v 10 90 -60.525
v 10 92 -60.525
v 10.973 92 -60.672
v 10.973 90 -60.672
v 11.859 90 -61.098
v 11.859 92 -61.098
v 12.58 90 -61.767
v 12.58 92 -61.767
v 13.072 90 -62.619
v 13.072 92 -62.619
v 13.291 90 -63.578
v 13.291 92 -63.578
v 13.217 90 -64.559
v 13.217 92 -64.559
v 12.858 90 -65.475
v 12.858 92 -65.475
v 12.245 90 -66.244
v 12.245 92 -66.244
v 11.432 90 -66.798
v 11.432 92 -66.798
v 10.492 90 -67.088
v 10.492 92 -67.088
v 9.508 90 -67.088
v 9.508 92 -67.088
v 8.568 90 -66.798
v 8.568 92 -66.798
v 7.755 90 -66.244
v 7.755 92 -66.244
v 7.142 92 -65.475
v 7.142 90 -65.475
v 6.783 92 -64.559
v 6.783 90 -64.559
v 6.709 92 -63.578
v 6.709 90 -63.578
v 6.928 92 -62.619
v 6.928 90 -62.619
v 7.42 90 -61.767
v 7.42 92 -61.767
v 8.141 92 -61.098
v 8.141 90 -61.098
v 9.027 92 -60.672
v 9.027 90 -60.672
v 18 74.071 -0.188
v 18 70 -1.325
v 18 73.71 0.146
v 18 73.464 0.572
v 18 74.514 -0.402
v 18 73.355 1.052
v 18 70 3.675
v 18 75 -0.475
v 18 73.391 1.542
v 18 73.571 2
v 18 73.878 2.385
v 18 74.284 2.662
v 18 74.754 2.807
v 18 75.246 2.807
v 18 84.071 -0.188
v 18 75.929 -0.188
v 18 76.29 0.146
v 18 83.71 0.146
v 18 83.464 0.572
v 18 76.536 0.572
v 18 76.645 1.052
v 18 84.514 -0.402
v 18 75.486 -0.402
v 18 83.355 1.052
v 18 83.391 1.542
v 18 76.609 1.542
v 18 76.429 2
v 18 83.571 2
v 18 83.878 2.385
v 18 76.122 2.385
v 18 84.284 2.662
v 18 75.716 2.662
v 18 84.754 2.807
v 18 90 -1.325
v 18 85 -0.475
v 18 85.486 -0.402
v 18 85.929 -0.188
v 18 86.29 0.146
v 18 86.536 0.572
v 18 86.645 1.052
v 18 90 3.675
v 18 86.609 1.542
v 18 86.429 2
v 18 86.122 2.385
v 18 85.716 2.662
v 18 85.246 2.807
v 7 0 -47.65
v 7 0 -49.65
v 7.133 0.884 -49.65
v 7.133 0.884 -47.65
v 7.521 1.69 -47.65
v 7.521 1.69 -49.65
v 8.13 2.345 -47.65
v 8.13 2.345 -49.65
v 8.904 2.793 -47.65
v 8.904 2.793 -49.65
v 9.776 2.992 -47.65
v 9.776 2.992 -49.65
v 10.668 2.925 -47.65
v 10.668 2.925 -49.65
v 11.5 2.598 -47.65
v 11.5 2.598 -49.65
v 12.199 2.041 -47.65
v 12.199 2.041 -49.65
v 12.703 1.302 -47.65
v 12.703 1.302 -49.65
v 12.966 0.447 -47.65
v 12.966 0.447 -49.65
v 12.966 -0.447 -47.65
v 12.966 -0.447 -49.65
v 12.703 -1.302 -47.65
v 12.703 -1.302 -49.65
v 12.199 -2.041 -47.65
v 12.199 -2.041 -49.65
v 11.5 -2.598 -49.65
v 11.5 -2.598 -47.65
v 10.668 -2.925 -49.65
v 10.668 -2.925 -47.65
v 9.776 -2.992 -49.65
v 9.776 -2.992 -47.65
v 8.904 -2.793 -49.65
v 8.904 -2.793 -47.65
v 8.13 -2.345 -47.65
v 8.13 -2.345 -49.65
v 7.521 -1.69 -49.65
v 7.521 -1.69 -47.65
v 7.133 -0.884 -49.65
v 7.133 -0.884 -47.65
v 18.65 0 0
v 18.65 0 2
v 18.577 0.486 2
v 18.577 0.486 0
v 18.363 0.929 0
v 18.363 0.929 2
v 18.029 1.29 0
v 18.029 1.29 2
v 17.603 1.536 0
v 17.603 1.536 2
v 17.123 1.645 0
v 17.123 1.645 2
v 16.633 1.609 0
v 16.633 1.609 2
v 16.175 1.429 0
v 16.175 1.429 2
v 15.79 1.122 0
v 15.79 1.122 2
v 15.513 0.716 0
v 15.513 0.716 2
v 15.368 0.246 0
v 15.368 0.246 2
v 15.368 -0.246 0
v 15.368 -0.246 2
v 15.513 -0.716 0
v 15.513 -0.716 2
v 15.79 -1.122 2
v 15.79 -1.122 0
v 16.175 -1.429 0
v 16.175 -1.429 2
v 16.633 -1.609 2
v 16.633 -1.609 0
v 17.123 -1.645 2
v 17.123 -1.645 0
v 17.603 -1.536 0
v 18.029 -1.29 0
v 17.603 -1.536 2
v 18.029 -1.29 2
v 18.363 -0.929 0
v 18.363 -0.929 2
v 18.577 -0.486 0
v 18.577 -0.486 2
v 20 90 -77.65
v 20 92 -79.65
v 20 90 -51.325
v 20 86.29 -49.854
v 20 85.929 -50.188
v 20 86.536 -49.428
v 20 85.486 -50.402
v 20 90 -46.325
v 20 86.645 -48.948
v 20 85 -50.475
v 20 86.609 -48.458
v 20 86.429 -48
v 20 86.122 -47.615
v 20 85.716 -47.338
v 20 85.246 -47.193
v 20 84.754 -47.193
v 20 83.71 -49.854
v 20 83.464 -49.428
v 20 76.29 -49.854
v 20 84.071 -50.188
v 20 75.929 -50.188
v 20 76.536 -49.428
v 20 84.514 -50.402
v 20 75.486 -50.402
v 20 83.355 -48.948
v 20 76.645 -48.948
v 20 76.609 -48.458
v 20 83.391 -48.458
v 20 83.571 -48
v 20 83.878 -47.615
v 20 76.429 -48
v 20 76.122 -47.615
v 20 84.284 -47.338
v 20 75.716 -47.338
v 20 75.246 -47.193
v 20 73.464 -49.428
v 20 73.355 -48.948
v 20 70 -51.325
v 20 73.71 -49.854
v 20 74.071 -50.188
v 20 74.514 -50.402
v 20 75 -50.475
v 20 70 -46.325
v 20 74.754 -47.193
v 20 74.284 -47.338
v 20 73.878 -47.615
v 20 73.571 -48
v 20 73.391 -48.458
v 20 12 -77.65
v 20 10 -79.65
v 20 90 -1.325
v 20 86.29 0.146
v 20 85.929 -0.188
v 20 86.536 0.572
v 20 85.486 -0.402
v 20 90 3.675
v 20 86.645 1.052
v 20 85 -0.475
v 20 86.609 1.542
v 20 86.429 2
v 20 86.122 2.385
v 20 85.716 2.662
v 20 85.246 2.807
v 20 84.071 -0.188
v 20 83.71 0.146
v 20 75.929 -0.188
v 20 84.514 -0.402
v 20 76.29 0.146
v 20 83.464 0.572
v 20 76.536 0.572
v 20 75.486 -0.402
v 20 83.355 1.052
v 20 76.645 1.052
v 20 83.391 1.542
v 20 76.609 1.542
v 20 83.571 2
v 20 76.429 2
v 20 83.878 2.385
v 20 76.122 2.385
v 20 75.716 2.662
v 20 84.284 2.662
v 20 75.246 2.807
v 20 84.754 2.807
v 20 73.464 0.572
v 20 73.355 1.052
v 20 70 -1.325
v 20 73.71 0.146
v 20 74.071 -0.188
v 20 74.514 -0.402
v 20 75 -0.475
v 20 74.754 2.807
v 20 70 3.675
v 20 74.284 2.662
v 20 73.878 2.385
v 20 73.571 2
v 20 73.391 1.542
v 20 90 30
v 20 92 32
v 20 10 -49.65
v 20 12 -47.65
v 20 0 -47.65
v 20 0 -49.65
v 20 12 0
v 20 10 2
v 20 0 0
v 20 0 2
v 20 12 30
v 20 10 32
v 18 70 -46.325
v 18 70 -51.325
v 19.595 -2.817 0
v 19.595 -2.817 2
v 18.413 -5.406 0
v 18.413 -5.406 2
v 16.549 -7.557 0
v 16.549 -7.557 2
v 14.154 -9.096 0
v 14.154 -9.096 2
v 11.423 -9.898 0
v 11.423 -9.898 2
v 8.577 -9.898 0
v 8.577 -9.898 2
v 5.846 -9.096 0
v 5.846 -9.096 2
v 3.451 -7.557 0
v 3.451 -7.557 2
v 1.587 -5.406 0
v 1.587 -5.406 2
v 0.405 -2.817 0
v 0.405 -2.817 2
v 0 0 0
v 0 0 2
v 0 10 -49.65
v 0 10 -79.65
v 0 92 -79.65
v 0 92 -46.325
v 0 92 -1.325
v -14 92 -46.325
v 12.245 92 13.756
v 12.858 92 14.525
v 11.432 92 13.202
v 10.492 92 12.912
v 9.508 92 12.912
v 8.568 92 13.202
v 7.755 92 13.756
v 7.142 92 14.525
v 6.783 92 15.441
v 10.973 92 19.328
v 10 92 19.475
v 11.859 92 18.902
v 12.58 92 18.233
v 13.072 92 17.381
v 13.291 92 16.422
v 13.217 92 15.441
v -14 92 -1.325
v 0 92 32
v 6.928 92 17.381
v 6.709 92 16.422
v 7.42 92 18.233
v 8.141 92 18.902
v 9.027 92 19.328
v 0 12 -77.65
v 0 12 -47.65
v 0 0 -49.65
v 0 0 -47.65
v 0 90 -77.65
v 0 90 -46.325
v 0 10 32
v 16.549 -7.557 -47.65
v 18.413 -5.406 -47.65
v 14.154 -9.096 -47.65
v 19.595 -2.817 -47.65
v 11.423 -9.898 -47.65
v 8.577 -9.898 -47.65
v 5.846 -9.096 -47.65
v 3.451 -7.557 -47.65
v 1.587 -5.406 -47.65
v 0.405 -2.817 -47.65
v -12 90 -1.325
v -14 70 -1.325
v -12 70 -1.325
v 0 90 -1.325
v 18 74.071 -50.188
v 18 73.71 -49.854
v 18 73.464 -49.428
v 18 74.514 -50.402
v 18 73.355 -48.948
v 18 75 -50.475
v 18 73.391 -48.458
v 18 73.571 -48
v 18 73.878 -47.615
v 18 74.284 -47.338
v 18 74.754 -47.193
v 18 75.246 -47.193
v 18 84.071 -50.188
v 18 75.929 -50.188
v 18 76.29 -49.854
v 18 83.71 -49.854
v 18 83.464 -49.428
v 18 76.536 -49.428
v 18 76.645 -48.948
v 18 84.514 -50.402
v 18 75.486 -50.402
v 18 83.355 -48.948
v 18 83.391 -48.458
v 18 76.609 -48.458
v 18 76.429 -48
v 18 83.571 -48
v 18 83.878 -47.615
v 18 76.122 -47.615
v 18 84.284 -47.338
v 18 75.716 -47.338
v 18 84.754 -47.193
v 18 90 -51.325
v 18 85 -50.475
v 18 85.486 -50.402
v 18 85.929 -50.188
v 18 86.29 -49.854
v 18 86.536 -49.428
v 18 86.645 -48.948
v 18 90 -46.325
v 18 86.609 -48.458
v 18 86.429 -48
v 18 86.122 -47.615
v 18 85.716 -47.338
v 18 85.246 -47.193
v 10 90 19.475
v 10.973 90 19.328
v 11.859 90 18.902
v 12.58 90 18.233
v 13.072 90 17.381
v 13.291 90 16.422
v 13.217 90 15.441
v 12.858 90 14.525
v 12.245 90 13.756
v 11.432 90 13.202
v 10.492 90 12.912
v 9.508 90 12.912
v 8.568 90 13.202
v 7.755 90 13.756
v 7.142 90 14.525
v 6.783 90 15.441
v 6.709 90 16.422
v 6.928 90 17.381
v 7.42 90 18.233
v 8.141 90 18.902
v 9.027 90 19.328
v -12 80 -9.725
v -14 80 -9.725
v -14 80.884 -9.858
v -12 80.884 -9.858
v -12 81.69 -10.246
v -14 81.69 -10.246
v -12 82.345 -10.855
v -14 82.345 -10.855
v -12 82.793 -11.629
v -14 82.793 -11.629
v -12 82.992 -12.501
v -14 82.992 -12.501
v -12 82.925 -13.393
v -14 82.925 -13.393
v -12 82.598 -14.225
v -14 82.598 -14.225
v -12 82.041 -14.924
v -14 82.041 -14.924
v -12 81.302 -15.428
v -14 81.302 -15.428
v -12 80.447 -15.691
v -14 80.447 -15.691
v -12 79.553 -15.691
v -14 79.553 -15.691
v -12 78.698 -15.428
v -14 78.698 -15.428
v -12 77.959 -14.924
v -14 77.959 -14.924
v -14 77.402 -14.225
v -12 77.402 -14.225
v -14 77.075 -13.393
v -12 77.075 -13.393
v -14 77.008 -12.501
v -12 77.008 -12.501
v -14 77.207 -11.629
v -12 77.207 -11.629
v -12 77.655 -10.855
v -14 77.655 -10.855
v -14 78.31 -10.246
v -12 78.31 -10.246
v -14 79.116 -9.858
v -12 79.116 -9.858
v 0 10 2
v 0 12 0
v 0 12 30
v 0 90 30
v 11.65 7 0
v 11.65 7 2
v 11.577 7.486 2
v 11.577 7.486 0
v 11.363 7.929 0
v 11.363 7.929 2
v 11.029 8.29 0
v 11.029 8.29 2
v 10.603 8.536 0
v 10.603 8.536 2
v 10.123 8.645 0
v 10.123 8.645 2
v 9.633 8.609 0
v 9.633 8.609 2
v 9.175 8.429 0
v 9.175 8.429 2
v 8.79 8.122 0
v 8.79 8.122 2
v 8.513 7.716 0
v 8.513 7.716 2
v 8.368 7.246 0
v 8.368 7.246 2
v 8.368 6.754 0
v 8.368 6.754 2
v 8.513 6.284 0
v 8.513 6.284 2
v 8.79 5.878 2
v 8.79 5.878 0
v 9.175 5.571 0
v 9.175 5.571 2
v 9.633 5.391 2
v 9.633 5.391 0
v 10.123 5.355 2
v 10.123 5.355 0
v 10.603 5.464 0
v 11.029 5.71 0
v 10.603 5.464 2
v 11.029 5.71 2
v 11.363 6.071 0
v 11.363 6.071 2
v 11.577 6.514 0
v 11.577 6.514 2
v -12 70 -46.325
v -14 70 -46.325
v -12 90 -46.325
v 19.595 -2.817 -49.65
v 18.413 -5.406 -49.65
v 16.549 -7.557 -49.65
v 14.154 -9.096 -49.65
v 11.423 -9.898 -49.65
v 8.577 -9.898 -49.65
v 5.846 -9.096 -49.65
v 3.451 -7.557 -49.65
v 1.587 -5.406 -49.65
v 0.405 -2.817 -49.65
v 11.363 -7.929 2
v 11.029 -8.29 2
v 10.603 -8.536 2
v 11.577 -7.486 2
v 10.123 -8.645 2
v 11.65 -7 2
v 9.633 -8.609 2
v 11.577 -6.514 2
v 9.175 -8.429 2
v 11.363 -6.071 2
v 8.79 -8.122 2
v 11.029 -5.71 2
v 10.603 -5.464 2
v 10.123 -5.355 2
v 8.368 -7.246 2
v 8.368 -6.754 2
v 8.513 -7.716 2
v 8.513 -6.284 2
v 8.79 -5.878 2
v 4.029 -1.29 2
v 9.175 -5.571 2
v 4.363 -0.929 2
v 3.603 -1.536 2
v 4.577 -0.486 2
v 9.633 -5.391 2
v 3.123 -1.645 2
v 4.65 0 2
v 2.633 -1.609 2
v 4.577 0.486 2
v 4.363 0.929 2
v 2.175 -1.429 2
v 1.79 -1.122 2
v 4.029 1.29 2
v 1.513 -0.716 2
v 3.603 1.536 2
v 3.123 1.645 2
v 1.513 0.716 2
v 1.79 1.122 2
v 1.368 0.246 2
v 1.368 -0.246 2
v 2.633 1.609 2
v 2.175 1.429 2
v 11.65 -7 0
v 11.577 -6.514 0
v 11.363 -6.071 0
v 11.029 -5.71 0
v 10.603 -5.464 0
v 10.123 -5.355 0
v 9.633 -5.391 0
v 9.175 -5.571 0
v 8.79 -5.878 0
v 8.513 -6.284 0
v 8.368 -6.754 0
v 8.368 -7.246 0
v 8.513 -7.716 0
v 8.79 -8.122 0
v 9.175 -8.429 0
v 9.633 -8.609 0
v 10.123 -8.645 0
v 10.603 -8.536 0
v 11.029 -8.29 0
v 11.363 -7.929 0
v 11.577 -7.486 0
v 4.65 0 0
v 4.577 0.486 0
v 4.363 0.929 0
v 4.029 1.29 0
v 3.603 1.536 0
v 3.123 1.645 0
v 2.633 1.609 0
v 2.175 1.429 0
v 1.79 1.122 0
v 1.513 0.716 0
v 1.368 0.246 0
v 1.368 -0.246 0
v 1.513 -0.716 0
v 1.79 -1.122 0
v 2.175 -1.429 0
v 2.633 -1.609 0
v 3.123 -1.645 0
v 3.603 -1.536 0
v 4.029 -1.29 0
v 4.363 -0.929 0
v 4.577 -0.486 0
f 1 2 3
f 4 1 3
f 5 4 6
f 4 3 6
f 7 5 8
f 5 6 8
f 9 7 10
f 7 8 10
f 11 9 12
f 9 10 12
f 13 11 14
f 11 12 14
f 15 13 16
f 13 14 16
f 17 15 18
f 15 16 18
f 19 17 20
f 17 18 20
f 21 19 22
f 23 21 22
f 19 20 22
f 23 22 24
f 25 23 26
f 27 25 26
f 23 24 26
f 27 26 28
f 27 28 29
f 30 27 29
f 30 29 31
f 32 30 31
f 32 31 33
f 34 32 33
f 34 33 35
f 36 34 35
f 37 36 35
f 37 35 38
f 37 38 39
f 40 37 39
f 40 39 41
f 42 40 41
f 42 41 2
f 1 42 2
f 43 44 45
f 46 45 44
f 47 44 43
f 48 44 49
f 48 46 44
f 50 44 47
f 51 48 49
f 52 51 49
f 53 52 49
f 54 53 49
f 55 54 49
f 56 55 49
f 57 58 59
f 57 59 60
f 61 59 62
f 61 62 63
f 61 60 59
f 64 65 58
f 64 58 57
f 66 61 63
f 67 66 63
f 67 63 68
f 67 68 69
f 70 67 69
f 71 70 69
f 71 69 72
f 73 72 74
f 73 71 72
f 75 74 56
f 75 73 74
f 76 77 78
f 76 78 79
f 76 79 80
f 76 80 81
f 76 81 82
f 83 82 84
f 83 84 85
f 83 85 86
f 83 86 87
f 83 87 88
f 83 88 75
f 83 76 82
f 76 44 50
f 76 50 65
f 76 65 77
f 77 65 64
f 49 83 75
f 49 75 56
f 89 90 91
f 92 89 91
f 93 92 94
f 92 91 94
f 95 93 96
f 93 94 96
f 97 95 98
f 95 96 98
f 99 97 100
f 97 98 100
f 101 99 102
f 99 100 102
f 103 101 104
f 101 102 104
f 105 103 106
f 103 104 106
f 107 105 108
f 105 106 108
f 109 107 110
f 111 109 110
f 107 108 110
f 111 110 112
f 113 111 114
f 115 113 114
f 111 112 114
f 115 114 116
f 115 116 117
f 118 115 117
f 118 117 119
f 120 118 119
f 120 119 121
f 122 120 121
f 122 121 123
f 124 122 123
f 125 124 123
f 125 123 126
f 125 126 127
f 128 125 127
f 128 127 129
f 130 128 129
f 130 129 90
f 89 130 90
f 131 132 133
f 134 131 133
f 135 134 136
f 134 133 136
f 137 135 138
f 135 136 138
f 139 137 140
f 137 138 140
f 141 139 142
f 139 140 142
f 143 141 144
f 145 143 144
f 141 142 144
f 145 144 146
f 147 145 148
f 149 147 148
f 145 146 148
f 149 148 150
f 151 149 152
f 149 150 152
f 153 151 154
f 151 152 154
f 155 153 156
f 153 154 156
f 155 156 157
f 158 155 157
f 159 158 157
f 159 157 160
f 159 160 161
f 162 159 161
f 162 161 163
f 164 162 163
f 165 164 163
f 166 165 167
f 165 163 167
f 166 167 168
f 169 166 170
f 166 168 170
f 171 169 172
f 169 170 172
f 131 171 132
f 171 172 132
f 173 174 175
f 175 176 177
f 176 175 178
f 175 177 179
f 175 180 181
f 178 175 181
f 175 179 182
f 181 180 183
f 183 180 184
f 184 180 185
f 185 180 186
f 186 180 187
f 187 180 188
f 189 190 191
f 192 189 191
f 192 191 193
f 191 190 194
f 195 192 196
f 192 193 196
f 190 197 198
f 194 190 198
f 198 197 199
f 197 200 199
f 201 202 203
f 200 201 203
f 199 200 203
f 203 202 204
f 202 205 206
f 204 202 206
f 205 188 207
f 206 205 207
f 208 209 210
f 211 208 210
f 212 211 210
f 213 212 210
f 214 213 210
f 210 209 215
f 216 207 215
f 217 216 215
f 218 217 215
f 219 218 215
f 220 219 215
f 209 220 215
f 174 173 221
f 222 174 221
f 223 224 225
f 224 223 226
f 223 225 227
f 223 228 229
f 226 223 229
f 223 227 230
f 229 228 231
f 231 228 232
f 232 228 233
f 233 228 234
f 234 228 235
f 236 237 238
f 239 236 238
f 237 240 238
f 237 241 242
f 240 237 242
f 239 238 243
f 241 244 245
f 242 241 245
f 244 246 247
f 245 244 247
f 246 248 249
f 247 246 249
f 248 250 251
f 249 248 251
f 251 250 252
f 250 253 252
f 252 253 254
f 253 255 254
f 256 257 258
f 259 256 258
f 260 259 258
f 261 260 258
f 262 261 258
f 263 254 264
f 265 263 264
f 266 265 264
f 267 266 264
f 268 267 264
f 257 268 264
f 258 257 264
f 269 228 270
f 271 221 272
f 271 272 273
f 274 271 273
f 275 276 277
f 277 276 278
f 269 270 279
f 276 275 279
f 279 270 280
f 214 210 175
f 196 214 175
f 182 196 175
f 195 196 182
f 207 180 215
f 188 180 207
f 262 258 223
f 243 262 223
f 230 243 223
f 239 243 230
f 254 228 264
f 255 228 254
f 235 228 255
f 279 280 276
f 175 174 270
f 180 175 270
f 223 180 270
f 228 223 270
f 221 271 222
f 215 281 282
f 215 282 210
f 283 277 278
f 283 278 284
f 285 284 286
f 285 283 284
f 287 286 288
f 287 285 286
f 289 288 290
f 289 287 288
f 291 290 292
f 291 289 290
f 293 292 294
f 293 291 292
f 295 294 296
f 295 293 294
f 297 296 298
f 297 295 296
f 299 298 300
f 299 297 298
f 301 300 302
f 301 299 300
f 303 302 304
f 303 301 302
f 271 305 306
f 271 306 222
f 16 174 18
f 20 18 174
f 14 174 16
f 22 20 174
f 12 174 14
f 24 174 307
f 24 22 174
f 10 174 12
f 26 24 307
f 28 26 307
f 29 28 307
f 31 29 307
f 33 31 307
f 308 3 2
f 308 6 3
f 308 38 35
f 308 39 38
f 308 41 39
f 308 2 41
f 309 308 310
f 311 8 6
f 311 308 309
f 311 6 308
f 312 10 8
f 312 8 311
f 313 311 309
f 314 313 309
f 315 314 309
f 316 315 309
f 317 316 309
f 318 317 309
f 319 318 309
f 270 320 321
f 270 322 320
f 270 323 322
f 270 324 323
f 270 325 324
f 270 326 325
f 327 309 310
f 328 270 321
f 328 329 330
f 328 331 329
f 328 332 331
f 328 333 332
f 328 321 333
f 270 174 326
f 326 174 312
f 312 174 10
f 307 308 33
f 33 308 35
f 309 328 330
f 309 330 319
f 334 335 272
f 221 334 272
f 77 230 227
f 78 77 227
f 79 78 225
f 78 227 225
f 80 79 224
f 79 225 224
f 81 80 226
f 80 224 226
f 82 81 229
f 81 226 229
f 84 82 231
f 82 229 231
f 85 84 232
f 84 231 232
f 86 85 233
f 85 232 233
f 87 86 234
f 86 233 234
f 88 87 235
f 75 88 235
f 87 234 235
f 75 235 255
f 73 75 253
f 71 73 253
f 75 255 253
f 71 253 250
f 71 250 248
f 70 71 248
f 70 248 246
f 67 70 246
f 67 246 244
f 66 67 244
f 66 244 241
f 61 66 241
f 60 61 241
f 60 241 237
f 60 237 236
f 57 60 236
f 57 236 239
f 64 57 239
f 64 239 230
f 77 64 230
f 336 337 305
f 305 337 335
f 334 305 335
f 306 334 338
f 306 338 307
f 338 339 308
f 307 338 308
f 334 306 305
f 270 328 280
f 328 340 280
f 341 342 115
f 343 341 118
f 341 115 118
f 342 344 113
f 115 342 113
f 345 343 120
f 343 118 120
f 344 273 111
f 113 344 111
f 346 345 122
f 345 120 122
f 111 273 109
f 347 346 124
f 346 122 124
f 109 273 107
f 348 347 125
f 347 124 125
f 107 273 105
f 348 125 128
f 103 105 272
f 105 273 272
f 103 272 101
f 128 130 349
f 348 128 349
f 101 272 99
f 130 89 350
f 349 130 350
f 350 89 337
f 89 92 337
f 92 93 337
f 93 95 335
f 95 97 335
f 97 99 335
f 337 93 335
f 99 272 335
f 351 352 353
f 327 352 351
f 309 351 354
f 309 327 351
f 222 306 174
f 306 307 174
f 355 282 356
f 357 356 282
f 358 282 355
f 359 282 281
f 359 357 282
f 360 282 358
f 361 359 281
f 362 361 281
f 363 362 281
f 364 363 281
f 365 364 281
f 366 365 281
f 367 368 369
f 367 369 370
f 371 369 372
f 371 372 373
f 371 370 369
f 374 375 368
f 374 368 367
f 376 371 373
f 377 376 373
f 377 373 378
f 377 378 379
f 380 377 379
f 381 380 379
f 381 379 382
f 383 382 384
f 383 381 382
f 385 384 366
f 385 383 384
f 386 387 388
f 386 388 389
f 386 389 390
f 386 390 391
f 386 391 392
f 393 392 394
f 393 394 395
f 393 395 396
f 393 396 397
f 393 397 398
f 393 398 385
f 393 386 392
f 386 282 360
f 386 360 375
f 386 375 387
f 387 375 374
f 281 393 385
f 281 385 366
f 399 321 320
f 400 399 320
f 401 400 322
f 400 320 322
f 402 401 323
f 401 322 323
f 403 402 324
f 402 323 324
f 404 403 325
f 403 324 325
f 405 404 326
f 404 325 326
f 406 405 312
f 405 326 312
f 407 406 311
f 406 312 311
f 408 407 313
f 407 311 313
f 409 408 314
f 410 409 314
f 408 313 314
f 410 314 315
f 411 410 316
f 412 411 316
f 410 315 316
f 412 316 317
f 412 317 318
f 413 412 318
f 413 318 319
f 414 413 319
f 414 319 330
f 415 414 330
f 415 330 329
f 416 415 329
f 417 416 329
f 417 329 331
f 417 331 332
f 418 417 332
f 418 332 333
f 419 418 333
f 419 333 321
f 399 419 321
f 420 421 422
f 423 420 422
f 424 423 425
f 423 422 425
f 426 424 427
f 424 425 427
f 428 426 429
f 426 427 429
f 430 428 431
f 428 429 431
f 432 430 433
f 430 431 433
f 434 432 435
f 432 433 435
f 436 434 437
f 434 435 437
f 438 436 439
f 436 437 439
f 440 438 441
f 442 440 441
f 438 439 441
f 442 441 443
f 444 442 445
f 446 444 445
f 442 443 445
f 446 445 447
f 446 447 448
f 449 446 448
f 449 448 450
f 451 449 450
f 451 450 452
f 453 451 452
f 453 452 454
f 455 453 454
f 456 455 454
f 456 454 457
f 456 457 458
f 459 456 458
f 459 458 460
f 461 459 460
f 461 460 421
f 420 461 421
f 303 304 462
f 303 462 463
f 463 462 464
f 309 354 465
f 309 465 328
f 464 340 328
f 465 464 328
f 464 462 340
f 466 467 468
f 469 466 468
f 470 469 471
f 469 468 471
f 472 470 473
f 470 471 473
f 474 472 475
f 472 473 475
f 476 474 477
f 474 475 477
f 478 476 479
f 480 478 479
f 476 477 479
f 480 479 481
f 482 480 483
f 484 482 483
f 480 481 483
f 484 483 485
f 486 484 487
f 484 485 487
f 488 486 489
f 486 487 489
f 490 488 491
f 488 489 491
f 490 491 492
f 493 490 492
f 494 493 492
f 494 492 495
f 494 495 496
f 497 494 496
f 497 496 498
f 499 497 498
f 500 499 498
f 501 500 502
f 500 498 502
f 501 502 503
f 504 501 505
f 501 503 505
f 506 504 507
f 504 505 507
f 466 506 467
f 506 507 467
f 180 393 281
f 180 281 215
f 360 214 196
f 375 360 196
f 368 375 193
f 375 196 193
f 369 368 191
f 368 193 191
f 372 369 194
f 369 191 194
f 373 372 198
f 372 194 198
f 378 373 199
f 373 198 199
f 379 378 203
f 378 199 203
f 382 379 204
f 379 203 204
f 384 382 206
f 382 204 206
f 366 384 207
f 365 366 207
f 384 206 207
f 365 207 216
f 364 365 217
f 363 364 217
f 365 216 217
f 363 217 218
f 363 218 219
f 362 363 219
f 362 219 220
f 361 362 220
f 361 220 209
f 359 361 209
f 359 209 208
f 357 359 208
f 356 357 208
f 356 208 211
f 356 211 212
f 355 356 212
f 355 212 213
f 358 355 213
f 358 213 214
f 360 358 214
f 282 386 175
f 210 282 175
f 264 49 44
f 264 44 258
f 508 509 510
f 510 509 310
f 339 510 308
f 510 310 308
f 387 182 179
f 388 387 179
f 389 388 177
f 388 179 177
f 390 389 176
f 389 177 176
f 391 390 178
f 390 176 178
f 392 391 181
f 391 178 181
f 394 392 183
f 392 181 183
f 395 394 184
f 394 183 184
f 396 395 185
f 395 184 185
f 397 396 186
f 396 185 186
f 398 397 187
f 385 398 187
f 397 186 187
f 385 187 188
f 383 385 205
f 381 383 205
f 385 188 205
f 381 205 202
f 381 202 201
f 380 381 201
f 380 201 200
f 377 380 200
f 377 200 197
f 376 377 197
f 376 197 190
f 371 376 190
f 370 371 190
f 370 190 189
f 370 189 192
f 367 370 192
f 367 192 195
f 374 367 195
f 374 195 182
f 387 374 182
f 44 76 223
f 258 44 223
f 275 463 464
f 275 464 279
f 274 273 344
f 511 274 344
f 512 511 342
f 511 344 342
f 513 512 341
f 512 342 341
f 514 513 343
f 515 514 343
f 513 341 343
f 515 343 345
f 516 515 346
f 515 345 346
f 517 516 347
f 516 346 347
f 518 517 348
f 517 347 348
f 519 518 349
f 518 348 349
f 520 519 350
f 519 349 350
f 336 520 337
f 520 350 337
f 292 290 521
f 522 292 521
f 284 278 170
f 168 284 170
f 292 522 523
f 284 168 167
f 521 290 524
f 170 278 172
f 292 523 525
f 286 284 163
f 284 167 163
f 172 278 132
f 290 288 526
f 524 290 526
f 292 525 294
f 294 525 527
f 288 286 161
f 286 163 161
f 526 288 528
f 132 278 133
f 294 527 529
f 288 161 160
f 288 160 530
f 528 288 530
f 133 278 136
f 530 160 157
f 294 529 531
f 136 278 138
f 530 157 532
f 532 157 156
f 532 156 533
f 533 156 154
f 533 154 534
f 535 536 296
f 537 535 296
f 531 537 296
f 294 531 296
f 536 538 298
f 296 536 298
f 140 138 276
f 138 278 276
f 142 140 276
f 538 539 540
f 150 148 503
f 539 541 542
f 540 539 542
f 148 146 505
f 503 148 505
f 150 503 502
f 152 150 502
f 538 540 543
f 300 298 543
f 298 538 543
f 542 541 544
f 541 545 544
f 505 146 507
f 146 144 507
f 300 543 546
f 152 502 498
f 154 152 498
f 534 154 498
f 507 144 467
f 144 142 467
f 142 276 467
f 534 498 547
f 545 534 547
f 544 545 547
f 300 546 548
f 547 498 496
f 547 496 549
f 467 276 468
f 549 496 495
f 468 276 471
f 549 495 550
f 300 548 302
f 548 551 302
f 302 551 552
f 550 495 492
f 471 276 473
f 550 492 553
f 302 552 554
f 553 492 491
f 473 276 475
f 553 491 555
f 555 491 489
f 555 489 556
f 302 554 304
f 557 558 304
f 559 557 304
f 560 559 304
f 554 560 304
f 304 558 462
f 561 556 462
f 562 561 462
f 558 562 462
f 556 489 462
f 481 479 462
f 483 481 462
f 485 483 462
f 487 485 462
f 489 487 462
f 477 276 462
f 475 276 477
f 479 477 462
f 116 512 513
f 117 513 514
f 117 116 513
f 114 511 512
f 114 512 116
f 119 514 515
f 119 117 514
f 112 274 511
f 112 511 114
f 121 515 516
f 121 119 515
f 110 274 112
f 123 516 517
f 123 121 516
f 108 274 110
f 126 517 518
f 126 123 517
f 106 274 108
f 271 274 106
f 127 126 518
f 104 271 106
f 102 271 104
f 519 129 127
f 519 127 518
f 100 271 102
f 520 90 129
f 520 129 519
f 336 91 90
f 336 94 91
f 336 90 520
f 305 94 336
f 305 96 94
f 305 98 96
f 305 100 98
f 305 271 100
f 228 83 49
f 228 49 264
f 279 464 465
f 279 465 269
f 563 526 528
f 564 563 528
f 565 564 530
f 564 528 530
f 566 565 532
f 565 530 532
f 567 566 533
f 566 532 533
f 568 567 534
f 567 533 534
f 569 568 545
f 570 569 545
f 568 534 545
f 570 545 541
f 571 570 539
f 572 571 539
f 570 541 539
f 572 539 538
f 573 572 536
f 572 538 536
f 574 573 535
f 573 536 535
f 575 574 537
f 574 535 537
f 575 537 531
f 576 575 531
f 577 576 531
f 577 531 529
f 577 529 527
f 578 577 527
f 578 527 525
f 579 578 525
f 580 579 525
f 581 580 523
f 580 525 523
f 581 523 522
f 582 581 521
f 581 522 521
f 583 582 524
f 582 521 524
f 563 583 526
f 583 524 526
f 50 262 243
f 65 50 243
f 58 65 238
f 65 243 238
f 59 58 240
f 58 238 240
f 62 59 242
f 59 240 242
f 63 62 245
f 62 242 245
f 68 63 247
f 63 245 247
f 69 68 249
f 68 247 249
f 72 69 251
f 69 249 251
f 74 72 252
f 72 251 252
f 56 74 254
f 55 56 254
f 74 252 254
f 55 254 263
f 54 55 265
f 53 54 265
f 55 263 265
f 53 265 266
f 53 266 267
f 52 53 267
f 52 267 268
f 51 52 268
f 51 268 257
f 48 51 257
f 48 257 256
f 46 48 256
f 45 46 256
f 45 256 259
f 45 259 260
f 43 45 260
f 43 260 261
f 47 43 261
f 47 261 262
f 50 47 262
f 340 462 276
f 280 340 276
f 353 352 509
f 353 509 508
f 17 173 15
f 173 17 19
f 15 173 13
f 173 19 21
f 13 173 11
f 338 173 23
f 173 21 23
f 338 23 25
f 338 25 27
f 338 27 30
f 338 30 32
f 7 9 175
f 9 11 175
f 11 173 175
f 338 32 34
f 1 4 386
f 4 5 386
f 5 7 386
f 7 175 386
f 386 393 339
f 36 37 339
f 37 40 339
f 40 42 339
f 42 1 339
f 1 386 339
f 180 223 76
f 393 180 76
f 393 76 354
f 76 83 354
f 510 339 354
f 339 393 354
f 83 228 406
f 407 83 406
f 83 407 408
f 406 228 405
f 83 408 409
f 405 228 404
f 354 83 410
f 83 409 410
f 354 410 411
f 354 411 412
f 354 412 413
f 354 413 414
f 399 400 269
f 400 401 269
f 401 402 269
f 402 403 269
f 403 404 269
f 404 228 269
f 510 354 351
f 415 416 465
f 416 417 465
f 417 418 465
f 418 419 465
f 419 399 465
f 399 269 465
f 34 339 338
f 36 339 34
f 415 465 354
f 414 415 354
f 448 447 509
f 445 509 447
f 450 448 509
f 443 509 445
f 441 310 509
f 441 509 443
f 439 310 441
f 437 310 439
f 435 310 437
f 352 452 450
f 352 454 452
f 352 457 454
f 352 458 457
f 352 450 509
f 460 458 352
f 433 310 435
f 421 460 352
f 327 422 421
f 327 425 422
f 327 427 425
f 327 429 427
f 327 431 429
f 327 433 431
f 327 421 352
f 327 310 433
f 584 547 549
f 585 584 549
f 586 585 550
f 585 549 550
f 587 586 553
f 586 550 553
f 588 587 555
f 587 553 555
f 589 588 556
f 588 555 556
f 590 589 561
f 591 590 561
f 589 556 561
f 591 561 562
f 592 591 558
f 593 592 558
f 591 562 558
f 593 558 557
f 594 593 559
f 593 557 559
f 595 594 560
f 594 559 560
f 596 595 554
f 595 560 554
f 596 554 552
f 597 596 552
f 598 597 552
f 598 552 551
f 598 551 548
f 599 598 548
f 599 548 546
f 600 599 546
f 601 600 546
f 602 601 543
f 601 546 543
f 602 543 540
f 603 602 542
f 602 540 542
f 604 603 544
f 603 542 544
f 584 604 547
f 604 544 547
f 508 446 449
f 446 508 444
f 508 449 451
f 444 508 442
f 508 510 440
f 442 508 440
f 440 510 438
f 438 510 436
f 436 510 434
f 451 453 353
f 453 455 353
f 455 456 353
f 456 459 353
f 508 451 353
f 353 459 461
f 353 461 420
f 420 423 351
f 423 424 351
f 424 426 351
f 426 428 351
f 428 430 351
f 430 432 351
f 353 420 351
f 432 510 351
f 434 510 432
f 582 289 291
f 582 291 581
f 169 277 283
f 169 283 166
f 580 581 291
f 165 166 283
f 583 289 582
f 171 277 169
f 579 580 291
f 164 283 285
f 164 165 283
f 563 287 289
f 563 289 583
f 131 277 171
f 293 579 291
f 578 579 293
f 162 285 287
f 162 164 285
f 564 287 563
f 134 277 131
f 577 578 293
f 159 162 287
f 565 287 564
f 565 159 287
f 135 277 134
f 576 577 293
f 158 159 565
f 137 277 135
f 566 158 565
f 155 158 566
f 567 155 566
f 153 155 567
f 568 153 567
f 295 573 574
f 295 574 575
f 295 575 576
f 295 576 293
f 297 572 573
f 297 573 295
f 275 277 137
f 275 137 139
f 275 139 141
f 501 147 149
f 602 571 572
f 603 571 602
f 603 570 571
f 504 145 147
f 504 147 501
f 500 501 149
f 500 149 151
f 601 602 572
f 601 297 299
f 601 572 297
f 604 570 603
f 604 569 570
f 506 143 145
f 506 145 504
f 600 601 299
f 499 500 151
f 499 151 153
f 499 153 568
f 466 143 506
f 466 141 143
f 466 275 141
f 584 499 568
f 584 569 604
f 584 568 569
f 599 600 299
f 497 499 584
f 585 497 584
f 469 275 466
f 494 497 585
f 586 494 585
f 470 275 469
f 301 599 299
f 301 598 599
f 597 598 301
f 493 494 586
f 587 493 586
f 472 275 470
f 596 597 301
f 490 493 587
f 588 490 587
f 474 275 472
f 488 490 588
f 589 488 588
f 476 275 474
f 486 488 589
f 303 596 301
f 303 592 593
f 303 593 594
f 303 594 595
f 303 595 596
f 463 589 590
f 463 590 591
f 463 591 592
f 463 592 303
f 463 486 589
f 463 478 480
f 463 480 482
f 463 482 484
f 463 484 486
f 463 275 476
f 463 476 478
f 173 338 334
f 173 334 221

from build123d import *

# Parameters (mm, degrees)
EXTRUDE_1_DEPTH     = 2
SKETCH_2_R          = 1.65
CUT_EXTRUDE_1_DEPTH = 2
SKETCH_3_W          = 20
SKETCH_3_H          = 2
EXTRUDE_2_DEPTH     = 30
SKETCH_4_W          = 20
SKETCH_4_H          = 2
EXTRUDE_3_DEPTH     = 80
SKETCH_5_W          = 20
SKETCH_5_H          = 2
EXTRUDE_4_DEPTH     = 109.65
SKETCH_6_W          = 20
SKETCH_6_H          = 2
EXTRUDE_5_DEPTH     = 80
CUT_EXTRUDE_2_REACH = 126.622
SKETCH_8_R          = 3
SKETCH_9_W          = 2
SKETCH_9_H          = 5
EXTRUDE_6_DEPTH     = 20
SKETCH_10_R         = 1.65
CUT_EXTRUDE_3_DEPTH = 20
SKETCH_11_R         = 3.3
CUT_EXTRUDE_4_DEPTH = 10
SKETCH_12_W         = 45
SKETCH_12_H         = 2
EXTRUDE_7_DEPTH     = 14
SKETCH_13_W         = 2
SKETCH_13_H         = 45
EXTRUDE_8_DEPTH     = 20
SKETCH_14_R         = 3
CUT_EXTRUDE_6_DEPTH = 20


with BuildPart() as part:
    # 草图1 → 凸台-拉伸1 (new body)
    with BuildSketch(Plane.XY):
        with BuildLine():
            Line((0, 0), (0, 12))
            Line((0, 12), (20, 12))
            Line((20, 12), (20, 0))
            ThreePointArc((20, 0), (10, -10), (0, 0))
        make_face()
    extrude_1 = extrude(amount=EXTRUDE_1_DEPTH)

    # 草图2 → 切除-拉伸1 (cut)
    with BuildSketch(Plane.XY.offset(2)):
        with Locations((17, 0)):
            Circle(SKETCH_2_R)
        with Locations((10, -7)):
            Circle(SKETCH_2_R)
        with Locations((3, 0)):
            Circle(SKETCH_2_R)
        with Locations((10, 7)):
            Circle(SKETCH_2_R)
    extrude(amount=-CUT_EXTRUDE_1_DEPTH, mode=Mode.SUBTRACT)

    # 草图3 → 凸台-拉伸2 (add)
    with BuildSketch(Plane.XY.offset(2)):
        with Locations((10, 11)):
            Rectangle(SKETCH_3_W, SKETCH_3_H)
    extrude_2 = extrude(amount=EXTRUDE_2_DEPTH)

    # 草图4 → 凸台-拉伸3 (add)
    with BuildSketch(Plane(origin=(0, 12, 0), x_dir=(1, 0, 0), z_dir=(0, 1, 0))):
        with Locations((10, -31)):
            Rectangle(SKETCH_4_W, SKETCH_4_H)
    extrude(amount=EXTRUDE_3_DEPTH)

    # 草图5 → 凸台-拉伸4 (add)
    with BuildSketch(Plane(origin=(0, 0, 30), x_dir=(-1, 0, 0), z_dir=(0, 0, -1))):
        with Locations((-10, 91)):
            Rectangle(SKETCH_5_W, SKETCH_5_H)
    extrude(amount=EXTRUDE_4_DEPTH)

    # 草图6 → 凸台-拉伸5 (add)
    with BuildSketch(Plane.XZ.offset(-90)):
        with Locations((10, -78.65)):
            Rectangle(SKETCH_6_W, SKETCH_6_H)
    extrude(amount=EXTRUDE_5_DEPTH)

    # 镜向2: 凸台-拉伸2 across plane
    add(extrude_2.mirror(Plane.XY.offset(-23.825)))

    # 镜向3: 凸台-拉伸1 across plane
    add(extrude_1.mirror(Plane.XY.offset(-23.825)))

    # 草图8 → 切除-拉伸2 (cut, up to next)
    with BuildSketch(Plane(origin=(0, 0, -49.65), x_dir=(-1, 0, 0), z_dir=(0, 0, -1)), mode=Mode.PRIVATE) as cut_extrude_2_sk1:
        with Locations((-10, 0)):
            Circle(SKETCH_8_R)
    cut_extrude_2_tool1 = extrude(cut_extrude_2_sk1.sketch, amount=-CUT_EXTRUDE_2_REACH, mode=Mode.PRIVATE) & part.part
    add(cut_extrude_2_tool1.solids().sort_by_distance((10, 0, -49.65))[0], mode=Mode.SUBTRACT)

    # 草图9 → 凸台-拉伸6 (add)
    with BuildSketch(Plane.XZ.offset(-90)):
        with Locations((19, 1.175)):
            Rectangle(SKETCH_9_W, SKETCH_9_H)
        with Locations((19, -48.825)):
            Rectangle(SKETCH_9_W, SKETCH_9_H)
    extrude(amount=EXTRUDE_6_DEPTH)

    # 草图10 → 切除-拉伸3 (cut)
    with BuildSketch(Plane(origin=(20, 0, 0), x_dir=(0, 0, -1), z_dir=(1, 0, 0))):
        with Locations((-1.175, 75)):
            Circle(SKETCH_10_R)
        with Locations((-1.175, 85)):
            Circle(SKETCH_10_R)
        with Locations((48.825, 75)):
            Circle(SKETCH_10_R)
        with Locations((48.825, 85)):
            Circle(SKETCH_10_R)
    extrude(amount=-CUT_EXTRUDE_3_DEPTH, mode=Mode.SUBTRACT)

    # 草图11 → 切除-拉伸4 (cut)
    with BuildSketch(Plane(origin=(0, 92, 0), x_dir=(1, 0, 0), z_dir=(0, 1, 0))):
        with Locations(Location((10, 63.825, 0), (0, 0, 270))):
            Circle(SKETCH_11_R)
        with Locations(Location((10, -16.175, 0), (0, 0, 270))):
            Circle(SKETCH_11_R)
    extrude(amount=-CUT_EXTRUDE_4_DEPTH, mode=Mode.SUBTRACT)

    # 草图12 → 凸台-拉伸7 (add)
    with BuildSketch(Plane.ZY):
        with Locations((-23.825, 91)):
            Rectangle(SKETCH_12_W, SKETCH_12_H)
    extrude(amount=EXTRUDE_7_DEPTH)

    # 草图13 → 凸台-拉伸8 (add)
    with BuildSketch(Plane.XZ.offset(-90)):
        with Locations((-13, -23.825)):
            Rectangle(SKETCH_13_W, SKETCH_13_H)
    extrude(amount=EXTRUDE_8_DEPTH)

    # 草图14 → 切除-拉伸6 (cut)
    with BuildSketch(Plane.ZY.offset(14)):
        with Locations((-12.725, 80)):
            Circle(SKETCH_14_R)
    extrude(amount=-CUT_EXTRUDE_6_DEPTH, mode=Mode.SUBTRACT)


solid = part.part
